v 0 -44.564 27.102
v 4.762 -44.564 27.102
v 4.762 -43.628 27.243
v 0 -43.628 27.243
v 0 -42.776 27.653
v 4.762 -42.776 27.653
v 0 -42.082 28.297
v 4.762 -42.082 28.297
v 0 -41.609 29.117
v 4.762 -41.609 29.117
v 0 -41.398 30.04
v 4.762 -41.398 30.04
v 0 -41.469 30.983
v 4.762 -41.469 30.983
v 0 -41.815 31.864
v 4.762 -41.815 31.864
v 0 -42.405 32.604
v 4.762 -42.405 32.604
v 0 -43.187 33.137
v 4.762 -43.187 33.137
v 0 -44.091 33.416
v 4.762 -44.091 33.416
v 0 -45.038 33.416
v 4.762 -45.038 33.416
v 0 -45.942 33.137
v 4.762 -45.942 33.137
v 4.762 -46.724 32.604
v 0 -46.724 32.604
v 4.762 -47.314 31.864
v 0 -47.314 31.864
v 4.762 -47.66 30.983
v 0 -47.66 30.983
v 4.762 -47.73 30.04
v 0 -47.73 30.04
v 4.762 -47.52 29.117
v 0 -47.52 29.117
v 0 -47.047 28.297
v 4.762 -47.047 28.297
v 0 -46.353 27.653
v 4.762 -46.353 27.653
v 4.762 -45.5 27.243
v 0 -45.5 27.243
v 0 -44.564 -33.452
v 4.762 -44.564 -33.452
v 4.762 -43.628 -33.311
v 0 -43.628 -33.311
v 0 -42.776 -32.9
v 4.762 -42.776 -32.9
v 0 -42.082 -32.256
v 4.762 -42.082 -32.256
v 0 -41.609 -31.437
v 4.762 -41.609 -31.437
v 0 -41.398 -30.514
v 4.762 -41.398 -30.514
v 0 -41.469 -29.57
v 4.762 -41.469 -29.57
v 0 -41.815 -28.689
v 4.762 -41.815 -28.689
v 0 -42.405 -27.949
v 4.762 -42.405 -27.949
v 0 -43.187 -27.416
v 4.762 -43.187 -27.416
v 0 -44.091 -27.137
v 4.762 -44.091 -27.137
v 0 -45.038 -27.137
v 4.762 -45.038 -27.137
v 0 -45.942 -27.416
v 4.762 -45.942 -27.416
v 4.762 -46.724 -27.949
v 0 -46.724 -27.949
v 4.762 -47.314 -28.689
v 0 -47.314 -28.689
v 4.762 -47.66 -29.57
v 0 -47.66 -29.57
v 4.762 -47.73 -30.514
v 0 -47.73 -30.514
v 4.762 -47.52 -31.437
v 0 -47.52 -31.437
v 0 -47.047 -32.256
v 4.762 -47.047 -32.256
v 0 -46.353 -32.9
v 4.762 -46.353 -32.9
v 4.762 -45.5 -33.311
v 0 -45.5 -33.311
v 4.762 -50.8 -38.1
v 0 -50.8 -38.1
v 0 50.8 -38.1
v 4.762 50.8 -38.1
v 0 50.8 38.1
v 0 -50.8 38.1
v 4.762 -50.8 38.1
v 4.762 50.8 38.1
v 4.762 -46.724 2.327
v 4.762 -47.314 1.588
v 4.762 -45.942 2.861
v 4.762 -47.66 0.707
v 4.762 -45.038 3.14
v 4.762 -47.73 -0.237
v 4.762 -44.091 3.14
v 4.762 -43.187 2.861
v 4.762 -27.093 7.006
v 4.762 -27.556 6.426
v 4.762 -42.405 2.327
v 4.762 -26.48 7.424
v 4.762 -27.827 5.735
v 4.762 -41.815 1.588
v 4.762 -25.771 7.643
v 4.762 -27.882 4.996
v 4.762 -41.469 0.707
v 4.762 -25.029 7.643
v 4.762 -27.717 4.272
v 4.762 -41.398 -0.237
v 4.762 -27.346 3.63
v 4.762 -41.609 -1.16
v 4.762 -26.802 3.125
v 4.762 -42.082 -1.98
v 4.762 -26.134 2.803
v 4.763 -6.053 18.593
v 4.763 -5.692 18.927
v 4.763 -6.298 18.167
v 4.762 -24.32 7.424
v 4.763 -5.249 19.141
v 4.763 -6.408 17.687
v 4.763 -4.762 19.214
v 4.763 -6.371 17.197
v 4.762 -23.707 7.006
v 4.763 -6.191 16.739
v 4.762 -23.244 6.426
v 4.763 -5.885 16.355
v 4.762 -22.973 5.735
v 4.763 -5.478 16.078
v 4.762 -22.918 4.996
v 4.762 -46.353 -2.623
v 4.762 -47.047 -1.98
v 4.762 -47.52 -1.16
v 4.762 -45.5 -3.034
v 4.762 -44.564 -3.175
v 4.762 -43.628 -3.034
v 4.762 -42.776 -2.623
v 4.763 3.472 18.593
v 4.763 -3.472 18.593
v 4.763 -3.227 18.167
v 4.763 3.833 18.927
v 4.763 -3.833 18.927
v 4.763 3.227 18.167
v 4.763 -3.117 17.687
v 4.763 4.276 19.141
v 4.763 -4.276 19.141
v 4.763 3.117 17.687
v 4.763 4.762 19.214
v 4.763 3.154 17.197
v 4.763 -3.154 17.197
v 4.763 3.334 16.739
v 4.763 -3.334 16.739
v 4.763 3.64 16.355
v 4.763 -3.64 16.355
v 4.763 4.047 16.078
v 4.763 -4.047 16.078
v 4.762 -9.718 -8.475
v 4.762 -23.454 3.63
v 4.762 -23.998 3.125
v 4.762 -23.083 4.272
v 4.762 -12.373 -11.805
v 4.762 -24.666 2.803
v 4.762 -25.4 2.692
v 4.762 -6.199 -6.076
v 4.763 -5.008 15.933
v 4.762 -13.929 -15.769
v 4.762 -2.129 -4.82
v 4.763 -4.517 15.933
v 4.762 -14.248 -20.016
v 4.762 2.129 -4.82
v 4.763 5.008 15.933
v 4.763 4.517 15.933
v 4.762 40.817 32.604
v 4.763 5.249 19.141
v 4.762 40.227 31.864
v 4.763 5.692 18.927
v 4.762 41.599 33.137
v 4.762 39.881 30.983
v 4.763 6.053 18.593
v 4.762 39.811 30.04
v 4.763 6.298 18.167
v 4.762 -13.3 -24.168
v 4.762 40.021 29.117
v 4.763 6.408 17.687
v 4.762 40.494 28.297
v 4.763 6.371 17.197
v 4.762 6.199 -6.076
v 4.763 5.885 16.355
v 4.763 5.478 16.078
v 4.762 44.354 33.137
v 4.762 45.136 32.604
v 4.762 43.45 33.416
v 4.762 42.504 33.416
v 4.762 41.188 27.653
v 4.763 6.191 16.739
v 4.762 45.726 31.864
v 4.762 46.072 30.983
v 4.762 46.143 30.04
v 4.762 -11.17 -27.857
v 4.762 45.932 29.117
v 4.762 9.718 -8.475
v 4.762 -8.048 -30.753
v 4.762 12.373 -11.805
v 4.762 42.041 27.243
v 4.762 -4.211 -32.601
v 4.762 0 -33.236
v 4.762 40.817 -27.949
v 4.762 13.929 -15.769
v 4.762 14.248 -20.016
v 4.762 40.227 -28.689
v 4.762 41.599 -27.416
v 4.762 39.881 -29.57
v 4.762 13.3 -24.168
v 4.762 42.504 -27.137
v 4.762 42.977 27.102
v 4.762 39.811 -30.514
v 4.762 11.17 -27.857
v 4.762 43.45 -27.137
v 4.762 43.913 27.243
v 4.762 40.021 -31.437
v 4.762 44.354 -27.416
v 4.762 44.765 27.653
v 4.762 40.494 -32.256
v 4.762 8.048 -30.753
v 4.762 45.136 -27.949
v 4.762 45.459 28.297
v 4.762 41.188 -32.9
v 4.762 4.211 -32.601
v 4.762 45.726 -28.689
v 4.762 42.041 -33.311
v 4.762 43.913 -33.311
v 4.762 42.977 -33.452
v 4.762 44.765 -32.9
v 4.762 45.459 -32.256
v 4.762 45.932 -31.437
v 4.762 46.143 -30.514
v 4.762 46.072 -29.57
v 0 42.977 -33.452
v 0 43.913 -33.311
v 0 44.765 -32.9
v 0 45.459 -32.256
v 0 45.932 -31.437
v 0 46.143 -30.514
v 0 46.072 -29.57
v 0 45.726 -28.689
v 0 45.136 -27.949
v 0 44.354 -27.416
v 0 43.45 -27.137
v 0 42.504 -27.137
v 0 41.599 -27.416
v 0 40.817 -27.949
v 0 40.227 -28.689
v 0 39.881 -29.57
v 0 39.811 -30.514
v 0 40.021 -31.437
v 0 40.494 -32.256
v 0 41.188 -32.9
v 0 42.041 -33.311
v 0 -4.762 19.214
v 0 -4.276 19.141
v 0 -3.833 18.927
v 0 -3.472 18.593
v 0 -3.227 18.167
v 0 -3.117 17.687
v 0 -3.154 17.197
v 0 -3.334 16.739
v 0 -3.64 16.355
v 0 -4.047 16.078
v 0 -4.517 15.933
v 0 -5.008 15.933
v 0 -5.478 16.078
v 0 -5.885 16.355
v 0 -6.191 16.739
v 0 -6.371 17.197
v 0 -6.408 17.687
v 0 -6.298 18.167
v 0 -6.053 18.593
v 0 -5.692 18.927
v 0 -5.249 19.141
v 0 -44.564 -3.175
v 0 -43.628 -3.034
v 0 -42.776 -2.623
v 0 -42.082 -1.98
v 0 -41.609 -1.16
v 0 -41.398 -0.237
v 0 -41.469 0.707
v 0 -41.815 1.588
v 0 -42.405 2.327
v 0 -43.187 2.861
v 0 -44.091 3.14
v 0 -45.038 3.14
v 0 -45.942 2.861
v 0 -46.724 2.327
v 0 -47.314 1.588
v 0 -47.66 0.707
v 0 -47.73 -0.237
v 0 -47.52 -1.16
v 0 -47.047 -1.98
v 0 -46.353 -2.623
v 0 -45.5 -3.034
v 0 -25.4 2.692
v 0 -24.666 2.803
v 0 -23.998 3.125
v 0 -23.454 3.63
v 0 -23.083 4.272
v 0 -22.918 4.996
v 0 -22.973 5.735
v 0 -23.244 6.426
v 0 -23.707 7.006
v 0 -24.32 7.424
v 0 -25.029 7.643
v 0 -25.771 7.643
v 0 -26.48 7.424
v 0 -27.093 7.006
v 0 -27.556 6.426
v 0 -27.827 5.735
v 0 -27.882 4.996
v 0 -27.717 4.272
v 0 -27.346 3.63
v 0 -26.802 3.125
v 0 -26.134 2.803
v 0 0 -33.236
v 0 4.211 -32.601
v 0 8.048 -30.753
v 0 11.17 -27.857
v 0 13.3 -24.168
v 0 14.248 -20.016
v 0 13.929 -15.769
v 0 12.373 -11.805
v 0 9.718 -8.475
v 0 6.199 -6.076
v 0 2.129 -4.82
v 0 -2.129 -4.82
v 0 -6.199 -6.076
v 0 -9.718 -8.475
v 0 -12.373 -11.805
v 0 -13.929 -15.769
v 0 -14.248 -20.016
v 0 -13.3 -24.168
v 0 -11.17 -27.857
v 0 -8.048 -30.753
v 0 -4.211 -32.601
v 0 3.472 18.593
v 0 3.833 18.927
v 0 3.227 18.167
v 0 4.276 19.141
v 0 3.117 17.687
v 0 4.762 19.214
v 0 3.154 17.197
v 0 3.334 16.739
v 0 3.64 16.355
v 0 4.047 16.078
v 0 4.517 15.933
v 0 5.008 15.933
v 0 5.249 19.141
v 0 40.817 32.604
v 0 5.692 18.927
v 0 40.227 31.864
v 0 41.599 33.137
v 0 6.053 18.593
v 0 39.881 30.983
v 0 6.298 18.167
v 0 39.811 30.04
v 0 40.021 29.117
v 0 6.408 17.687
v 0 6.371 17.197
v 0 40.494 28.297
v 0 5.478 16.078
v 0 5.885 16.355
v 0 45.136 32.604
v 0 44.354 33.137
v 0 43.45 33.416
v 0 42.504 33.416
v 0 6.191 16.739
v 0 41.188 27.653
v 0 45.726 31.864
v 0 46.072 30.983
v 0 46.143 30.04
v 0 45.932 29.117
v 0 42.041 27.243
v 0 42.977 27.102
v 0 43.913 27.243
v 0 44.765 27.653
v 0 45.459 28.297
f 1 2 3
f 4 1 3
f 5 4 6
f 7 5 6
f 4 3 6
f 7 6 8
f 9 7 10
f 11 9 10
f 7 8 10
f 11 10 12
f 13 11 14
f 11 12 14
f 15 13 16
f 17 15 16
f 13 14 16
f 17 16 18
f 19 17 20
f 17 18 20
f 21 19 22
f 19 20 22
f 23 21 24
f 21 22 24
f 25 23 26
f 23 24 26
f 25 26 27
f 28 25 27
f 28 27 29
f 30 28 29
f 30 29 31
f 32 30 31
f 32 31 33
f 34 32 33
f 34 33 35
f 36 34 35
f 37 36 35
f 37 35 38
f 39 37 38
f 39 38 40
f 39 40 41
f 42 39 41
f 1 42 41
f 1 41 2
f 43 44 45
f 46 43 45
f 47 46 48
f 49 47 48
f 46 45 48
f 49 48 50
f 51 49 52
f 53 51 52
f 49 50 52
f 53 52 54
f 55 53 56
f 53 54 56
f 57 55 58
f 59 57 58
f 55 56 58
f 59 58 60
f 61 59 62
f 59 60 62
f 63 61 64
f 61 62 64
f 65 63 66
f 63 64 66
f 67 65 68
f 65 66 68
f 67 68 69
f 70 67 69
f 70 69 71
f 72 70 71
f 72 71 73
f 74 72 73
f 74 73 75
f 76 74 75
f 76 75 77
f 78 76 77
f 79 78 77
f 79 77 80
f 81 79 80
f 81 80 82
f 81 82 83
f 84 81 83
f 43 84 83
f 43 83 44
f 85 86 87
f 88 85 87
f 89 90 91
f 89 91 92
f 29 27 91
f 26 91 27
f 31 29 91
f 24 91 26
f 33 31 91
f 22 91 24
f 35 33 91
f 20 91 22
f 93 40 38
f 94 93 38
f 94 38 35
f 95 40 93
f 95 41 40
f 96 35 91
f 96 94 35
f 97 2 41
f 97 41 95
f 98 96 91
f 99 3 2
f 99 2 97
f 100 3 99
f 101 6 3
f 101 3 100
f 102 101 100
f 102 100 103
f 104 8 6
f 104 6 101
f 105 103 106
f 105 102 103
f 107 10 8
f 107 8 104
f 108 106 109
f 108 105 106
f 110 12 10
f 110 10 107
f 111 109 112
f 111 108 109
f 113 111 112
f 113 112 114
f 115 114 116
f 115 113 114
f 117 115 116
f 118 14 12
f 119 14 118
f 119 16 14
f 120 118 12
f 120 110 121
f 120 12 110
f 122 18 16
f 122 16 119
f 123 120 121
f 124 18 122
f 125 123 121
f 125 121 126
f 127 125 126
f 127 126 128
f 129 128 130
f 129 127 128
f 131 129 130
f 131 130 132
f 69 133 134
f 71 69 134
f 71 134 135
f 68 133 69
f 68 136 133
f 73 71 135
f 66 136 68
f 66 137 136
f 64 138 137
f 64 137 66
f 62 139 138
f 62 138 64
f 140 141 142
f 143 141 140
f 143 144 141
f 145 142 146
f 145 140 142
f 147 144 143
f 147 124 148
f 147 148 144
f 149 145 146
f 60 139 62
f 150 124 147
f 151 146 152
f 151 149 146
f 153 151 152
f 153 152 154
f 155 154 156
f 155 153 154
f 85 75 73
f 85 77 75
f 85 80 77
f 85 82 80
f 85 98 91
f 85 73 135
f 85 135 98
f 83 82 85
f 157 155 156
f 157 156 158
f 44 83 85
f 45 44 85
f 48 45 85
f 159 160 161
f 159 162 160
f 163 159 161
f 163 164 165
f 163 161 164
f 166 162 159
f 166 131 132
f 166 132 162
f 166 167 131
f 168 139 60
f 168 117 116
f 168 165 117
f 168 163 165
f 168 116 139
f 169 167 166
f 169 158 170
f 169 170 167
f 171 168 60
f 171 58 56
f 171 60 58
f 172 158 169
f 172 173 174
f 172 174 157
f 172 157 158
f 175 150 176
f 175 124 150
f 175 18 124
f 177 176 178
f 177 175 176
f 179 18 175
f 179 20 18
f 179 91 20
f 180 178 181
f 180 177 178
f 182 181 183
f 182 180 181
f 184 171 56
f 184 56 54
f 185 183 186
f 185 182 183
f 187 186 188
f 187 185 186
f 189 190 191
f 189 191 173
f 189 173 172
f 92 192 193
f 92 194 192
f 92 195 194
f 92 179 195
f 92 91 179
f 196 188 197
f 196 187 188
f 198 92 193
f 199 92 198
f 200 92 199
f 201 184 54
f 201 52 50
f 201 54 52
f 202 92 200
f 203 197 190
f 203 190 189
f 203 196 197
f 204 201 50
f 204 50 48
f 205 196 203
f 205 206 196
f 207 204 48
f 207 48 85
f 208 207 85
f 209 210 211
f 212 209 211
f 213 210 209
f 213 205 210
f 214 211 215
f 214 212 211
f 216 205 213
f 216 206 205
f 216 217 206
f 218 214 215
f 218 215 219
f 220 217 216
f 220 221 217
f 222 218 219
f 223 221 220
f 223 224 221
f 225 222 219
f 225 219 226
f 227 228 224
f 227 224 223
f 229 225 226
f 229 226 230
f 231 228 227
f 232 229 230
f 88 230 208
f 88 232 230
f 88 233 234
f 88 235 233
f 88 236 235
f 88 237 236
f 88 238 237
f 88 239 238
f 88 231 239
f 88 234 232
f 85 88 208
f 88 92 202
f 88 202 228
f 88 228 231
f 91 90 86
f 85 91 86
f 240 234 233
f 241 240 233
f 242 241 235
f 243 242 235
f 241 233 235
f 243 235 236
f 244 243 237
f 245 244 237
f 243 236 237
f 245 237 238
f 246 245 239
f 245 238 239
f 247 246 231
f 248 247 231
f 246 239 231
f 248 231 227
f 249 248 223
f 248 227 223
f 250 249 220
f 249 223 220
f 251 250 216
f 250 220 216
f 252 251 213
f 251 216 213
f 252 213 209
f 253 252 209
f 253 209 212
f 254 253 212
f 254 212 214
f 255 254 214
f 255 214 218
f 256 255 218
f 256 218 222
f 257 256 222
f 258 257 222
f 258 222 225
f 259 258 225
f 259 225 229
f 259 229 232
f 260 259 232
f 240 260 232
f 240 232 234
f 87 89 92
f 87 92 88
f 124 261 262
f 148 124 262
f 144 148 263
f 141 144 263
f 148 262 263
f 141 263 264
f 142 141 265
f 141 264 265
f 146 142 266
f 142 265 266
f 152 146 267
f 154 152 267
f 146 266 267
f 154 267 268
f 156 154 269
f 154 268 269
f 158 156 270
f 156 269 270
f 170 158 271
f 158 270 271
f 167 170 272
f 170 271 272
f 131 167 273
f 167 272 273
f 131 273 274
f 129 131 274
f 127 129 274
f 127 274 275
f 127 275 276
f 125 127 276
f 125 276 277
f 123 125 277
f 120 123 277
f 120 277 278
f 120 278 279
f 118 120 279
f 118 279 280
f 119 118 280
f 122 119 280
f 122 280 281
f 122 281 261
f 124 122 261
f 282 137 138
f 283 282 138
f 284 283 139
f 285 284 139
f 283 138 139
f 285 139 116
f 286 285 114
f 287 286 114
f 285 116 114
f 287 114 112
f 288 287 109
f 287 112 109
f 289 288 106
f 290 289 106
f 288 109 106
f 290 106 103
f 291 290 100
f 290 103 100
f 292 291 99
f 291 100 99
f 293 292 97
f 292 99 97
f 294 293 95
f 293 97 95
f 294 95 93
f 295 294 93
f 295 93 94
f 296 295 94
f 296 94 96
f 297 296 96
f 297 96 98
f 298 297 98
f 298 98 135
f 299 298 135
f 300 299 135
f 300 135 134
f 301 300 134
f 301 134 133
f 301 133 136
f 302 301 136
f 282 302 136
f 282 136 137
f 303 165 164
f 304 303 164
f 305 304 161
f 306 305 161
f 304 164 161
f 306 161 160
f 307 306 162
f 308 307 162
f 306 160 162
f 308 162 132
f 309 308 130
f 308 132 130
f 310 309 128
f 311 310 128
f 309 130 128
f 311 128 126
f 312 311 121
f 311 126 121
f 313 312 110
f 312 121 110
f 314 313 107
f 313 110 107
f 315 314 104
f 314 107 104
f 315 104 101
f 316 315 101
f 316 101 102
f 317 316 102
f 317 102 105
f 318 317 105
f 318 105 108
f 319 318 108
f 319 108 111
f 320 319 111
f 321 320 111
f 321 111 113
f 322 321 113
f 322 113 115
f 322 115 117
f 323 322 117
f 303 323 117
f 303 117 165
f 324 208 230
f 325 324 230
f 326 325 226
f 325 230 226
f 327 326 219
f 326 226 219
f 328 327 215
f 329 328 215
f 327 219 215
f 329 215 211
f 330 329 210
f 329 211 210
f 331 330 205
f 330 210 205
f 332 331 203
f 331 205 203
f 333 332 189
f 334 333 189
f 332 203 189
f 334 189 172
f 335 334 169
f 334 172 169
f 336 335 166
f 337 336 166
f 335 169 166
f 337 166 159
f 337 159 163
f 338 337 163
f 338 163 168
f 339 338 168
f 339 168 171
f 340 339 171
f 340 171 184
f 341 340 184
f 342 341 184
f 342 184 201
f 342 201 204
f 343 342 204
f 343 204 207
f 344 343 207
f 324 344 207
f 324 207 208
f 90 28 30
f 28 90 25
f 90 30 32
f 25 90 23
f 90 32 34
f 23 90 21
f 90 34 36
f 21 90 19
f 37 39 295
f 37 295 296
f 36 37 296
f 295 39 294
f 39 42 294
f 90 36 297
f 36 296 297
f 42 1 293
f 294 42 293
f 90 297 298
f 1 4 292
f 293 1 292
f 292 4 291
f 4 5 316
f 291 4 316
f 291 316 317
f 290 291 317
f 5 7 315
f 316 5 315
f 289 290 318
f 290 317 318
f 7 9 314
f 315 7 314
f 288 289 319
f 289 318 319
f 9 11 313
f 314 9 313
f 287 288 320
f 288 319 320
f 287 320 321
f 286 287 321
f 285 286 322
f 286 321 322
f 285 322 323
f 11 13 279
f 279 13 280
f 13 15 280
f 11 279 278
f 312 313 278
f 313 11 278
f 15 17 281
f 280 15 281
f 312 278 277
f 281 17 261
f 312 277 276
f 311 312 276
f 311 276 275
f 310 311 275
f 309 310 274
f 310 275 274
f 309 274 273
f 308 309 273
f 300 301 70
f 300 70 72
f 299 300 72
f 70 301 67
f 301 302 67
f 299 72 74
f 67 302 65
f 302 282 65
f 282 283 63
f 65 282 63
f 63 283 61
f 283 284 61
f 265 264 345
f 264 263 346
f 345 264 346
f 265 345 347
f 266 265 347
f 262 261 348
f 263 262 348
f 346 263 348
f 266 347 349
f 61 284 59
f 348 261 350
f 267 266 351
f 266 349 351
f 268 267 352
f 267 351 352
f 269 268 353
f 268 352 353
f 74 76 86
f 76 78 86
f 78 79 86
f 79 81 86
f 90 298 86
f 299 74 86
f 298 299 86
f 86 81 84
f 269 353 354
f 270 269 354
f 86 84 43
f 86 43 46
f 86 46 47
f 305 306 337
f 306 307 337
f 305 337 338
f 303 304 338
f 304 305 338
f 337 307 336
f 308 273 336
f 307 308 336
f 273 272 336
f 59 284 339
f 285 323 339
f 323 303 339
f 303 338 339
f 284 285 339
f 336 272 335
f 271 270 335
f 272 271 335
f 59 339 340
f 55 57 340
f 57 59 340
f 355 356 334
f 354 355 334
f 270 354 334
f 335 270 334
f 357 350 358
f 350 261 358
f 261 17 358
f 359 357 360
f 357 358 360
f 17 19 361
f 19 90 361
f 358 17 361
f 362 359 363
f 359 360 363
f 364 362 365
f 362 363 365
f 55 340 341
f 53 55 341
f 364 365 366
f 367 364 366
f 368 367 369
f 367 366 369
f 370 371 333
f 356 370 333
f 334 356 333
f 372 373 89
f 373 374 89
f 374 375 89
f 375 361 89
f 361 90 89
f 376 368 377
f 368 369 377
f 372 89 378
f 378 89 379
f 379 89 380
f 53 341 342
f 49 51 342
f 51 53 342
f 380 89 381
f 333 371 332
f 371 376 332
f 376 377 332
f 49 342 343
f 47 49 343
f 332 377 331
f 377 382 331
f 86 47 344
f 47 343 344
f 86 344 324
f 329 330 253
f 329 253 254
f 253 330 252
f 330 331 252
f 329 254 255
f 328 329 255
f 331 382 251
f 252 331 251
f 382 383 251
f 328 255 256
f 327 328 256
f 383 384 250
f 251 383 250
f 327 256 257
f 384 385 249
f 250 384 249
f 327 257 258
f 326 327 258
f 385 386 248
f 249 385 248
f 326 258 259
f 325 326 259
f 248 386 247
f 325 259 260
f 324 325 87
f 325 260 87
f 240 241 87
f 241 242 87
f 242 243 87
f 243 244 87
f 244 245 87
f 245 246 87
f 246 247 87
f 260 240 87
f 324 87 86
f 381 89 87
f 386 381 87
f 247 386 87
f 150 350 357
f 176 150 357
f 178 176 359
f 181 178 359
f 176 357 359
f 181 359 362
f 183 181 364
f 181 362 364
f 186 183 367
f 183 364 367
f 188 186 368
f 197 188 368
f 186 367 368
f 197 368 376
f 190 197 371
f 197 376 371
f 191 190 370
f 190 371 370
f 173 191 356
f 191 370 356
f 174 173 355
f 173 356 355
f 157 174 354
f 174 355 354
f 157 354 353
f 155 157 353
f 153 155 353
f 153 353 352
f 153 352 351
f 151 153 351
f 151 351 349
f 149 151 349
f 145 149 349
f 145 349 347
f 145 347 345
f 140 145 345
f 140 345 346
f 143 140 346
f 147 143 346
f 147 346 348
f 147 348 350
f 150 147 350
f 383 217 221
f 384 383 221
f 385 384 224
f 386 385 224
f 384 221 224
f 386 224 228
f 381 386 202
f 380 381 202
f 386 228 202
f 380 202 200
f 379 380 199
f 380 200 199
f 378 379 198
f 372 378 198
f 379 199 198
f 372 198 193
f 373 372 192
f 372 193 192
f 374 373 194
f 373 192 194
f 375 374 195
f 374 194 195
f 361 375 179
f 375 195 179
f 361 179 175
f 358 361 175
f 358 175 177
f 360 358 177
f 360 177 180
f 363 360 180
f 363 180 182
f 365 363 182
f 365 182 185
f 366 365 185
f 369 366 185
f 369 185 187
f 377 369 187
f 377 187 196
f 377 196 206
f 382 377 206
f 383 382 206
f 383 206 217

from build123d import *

# Parameters (mm, degrees)
SKETCH2_W            = 76.2
SKETCH2_H            = 101.6
BOSS_EXTRUDE1_DEPTH  = 4.7625
SKETCH3_R            = 3.175
CUT_EXTRUDE1_DEPTH   = 6.35
SKETCH3_4_R          = 3.175
SKETCH3_4_R_2        = 14.2875
SKETCH3_4_R_3        = 2.4892
CUT_EXTRUDE2_DEPTH   = 6.35
M6_CLEARANCE_HOLE1_D = 3.3


with BuildPart() as part:
    # Sketch2 → Boss-Extrude1 (new body)
    with BuildSketch(Plane(origin=(0, 0, 0), x_dir=(0, 0, -1), z_dir=(1, 0, 0))):
        Rectangle(SKETCH2_W, SKETCH2_H)
    extrude(amount=BOSS_EXTRUDE1_DEPTH)

    # Sketch3 → Cut-Extrude1 (cut)
    with BuildSketch(Plane(origin=(4.7625, 0, 0), x_dir=(0, 0, -1), z_dir=(1, 0, 0))):
        with Locations((30.2768, 42.9768)):
            Circle(SKETCH3_R)
    extrude(amount=-CUT_EXTRUDE1_DEPTH, mode=Mode.SUBTRACT)

    # Sketch3<4> → Cut-Extrude2 (cut)
    with BuildSketch(Plane(origin=(4.7625, 0, 0), x_dir=(0, 0, -1), z_dir=(1, 0, 0))):
        with Locations((30.2768, -44.5643)):
            Circle(SKETCH3_4_R)
        with Locations((30.2768, 42.9768)):
            Circle(SKETCH3_4_R)
        with Locations((-30.2768, 42.9768)):
            Circle(SKETCH3_4_R)
        with Locations((-30.2768, -44.5643)):
            Circle(SKETCH3_4_R)
        with Locations((18.9484, 0)):
            Circle(SKETCH3_4_R_2)
        with Locations((-5.1816, -25.4)):
            Circle(SKETCH3_4_R_3)
        with Locations((0, -44.5643)):
            Circle(SKETCH3_4_R)
    extrude(amount=-CUT_EXTRUDE2_DEPTH, mode=Mode.SUBTRACT)

    # M6 Clearance Hole1 (through all)
    with Locations(Plane(origin=(4.7625, 0, 0), x_dir=(0, 0, -1), z_dir=(1, 0, 0))):
        with Locations((-17.5641, 4.7625), (-17.5641, -4.7625)):
            Hole(M6_CLEARANCE_HOLE1_D / 2)


solid = part.part
